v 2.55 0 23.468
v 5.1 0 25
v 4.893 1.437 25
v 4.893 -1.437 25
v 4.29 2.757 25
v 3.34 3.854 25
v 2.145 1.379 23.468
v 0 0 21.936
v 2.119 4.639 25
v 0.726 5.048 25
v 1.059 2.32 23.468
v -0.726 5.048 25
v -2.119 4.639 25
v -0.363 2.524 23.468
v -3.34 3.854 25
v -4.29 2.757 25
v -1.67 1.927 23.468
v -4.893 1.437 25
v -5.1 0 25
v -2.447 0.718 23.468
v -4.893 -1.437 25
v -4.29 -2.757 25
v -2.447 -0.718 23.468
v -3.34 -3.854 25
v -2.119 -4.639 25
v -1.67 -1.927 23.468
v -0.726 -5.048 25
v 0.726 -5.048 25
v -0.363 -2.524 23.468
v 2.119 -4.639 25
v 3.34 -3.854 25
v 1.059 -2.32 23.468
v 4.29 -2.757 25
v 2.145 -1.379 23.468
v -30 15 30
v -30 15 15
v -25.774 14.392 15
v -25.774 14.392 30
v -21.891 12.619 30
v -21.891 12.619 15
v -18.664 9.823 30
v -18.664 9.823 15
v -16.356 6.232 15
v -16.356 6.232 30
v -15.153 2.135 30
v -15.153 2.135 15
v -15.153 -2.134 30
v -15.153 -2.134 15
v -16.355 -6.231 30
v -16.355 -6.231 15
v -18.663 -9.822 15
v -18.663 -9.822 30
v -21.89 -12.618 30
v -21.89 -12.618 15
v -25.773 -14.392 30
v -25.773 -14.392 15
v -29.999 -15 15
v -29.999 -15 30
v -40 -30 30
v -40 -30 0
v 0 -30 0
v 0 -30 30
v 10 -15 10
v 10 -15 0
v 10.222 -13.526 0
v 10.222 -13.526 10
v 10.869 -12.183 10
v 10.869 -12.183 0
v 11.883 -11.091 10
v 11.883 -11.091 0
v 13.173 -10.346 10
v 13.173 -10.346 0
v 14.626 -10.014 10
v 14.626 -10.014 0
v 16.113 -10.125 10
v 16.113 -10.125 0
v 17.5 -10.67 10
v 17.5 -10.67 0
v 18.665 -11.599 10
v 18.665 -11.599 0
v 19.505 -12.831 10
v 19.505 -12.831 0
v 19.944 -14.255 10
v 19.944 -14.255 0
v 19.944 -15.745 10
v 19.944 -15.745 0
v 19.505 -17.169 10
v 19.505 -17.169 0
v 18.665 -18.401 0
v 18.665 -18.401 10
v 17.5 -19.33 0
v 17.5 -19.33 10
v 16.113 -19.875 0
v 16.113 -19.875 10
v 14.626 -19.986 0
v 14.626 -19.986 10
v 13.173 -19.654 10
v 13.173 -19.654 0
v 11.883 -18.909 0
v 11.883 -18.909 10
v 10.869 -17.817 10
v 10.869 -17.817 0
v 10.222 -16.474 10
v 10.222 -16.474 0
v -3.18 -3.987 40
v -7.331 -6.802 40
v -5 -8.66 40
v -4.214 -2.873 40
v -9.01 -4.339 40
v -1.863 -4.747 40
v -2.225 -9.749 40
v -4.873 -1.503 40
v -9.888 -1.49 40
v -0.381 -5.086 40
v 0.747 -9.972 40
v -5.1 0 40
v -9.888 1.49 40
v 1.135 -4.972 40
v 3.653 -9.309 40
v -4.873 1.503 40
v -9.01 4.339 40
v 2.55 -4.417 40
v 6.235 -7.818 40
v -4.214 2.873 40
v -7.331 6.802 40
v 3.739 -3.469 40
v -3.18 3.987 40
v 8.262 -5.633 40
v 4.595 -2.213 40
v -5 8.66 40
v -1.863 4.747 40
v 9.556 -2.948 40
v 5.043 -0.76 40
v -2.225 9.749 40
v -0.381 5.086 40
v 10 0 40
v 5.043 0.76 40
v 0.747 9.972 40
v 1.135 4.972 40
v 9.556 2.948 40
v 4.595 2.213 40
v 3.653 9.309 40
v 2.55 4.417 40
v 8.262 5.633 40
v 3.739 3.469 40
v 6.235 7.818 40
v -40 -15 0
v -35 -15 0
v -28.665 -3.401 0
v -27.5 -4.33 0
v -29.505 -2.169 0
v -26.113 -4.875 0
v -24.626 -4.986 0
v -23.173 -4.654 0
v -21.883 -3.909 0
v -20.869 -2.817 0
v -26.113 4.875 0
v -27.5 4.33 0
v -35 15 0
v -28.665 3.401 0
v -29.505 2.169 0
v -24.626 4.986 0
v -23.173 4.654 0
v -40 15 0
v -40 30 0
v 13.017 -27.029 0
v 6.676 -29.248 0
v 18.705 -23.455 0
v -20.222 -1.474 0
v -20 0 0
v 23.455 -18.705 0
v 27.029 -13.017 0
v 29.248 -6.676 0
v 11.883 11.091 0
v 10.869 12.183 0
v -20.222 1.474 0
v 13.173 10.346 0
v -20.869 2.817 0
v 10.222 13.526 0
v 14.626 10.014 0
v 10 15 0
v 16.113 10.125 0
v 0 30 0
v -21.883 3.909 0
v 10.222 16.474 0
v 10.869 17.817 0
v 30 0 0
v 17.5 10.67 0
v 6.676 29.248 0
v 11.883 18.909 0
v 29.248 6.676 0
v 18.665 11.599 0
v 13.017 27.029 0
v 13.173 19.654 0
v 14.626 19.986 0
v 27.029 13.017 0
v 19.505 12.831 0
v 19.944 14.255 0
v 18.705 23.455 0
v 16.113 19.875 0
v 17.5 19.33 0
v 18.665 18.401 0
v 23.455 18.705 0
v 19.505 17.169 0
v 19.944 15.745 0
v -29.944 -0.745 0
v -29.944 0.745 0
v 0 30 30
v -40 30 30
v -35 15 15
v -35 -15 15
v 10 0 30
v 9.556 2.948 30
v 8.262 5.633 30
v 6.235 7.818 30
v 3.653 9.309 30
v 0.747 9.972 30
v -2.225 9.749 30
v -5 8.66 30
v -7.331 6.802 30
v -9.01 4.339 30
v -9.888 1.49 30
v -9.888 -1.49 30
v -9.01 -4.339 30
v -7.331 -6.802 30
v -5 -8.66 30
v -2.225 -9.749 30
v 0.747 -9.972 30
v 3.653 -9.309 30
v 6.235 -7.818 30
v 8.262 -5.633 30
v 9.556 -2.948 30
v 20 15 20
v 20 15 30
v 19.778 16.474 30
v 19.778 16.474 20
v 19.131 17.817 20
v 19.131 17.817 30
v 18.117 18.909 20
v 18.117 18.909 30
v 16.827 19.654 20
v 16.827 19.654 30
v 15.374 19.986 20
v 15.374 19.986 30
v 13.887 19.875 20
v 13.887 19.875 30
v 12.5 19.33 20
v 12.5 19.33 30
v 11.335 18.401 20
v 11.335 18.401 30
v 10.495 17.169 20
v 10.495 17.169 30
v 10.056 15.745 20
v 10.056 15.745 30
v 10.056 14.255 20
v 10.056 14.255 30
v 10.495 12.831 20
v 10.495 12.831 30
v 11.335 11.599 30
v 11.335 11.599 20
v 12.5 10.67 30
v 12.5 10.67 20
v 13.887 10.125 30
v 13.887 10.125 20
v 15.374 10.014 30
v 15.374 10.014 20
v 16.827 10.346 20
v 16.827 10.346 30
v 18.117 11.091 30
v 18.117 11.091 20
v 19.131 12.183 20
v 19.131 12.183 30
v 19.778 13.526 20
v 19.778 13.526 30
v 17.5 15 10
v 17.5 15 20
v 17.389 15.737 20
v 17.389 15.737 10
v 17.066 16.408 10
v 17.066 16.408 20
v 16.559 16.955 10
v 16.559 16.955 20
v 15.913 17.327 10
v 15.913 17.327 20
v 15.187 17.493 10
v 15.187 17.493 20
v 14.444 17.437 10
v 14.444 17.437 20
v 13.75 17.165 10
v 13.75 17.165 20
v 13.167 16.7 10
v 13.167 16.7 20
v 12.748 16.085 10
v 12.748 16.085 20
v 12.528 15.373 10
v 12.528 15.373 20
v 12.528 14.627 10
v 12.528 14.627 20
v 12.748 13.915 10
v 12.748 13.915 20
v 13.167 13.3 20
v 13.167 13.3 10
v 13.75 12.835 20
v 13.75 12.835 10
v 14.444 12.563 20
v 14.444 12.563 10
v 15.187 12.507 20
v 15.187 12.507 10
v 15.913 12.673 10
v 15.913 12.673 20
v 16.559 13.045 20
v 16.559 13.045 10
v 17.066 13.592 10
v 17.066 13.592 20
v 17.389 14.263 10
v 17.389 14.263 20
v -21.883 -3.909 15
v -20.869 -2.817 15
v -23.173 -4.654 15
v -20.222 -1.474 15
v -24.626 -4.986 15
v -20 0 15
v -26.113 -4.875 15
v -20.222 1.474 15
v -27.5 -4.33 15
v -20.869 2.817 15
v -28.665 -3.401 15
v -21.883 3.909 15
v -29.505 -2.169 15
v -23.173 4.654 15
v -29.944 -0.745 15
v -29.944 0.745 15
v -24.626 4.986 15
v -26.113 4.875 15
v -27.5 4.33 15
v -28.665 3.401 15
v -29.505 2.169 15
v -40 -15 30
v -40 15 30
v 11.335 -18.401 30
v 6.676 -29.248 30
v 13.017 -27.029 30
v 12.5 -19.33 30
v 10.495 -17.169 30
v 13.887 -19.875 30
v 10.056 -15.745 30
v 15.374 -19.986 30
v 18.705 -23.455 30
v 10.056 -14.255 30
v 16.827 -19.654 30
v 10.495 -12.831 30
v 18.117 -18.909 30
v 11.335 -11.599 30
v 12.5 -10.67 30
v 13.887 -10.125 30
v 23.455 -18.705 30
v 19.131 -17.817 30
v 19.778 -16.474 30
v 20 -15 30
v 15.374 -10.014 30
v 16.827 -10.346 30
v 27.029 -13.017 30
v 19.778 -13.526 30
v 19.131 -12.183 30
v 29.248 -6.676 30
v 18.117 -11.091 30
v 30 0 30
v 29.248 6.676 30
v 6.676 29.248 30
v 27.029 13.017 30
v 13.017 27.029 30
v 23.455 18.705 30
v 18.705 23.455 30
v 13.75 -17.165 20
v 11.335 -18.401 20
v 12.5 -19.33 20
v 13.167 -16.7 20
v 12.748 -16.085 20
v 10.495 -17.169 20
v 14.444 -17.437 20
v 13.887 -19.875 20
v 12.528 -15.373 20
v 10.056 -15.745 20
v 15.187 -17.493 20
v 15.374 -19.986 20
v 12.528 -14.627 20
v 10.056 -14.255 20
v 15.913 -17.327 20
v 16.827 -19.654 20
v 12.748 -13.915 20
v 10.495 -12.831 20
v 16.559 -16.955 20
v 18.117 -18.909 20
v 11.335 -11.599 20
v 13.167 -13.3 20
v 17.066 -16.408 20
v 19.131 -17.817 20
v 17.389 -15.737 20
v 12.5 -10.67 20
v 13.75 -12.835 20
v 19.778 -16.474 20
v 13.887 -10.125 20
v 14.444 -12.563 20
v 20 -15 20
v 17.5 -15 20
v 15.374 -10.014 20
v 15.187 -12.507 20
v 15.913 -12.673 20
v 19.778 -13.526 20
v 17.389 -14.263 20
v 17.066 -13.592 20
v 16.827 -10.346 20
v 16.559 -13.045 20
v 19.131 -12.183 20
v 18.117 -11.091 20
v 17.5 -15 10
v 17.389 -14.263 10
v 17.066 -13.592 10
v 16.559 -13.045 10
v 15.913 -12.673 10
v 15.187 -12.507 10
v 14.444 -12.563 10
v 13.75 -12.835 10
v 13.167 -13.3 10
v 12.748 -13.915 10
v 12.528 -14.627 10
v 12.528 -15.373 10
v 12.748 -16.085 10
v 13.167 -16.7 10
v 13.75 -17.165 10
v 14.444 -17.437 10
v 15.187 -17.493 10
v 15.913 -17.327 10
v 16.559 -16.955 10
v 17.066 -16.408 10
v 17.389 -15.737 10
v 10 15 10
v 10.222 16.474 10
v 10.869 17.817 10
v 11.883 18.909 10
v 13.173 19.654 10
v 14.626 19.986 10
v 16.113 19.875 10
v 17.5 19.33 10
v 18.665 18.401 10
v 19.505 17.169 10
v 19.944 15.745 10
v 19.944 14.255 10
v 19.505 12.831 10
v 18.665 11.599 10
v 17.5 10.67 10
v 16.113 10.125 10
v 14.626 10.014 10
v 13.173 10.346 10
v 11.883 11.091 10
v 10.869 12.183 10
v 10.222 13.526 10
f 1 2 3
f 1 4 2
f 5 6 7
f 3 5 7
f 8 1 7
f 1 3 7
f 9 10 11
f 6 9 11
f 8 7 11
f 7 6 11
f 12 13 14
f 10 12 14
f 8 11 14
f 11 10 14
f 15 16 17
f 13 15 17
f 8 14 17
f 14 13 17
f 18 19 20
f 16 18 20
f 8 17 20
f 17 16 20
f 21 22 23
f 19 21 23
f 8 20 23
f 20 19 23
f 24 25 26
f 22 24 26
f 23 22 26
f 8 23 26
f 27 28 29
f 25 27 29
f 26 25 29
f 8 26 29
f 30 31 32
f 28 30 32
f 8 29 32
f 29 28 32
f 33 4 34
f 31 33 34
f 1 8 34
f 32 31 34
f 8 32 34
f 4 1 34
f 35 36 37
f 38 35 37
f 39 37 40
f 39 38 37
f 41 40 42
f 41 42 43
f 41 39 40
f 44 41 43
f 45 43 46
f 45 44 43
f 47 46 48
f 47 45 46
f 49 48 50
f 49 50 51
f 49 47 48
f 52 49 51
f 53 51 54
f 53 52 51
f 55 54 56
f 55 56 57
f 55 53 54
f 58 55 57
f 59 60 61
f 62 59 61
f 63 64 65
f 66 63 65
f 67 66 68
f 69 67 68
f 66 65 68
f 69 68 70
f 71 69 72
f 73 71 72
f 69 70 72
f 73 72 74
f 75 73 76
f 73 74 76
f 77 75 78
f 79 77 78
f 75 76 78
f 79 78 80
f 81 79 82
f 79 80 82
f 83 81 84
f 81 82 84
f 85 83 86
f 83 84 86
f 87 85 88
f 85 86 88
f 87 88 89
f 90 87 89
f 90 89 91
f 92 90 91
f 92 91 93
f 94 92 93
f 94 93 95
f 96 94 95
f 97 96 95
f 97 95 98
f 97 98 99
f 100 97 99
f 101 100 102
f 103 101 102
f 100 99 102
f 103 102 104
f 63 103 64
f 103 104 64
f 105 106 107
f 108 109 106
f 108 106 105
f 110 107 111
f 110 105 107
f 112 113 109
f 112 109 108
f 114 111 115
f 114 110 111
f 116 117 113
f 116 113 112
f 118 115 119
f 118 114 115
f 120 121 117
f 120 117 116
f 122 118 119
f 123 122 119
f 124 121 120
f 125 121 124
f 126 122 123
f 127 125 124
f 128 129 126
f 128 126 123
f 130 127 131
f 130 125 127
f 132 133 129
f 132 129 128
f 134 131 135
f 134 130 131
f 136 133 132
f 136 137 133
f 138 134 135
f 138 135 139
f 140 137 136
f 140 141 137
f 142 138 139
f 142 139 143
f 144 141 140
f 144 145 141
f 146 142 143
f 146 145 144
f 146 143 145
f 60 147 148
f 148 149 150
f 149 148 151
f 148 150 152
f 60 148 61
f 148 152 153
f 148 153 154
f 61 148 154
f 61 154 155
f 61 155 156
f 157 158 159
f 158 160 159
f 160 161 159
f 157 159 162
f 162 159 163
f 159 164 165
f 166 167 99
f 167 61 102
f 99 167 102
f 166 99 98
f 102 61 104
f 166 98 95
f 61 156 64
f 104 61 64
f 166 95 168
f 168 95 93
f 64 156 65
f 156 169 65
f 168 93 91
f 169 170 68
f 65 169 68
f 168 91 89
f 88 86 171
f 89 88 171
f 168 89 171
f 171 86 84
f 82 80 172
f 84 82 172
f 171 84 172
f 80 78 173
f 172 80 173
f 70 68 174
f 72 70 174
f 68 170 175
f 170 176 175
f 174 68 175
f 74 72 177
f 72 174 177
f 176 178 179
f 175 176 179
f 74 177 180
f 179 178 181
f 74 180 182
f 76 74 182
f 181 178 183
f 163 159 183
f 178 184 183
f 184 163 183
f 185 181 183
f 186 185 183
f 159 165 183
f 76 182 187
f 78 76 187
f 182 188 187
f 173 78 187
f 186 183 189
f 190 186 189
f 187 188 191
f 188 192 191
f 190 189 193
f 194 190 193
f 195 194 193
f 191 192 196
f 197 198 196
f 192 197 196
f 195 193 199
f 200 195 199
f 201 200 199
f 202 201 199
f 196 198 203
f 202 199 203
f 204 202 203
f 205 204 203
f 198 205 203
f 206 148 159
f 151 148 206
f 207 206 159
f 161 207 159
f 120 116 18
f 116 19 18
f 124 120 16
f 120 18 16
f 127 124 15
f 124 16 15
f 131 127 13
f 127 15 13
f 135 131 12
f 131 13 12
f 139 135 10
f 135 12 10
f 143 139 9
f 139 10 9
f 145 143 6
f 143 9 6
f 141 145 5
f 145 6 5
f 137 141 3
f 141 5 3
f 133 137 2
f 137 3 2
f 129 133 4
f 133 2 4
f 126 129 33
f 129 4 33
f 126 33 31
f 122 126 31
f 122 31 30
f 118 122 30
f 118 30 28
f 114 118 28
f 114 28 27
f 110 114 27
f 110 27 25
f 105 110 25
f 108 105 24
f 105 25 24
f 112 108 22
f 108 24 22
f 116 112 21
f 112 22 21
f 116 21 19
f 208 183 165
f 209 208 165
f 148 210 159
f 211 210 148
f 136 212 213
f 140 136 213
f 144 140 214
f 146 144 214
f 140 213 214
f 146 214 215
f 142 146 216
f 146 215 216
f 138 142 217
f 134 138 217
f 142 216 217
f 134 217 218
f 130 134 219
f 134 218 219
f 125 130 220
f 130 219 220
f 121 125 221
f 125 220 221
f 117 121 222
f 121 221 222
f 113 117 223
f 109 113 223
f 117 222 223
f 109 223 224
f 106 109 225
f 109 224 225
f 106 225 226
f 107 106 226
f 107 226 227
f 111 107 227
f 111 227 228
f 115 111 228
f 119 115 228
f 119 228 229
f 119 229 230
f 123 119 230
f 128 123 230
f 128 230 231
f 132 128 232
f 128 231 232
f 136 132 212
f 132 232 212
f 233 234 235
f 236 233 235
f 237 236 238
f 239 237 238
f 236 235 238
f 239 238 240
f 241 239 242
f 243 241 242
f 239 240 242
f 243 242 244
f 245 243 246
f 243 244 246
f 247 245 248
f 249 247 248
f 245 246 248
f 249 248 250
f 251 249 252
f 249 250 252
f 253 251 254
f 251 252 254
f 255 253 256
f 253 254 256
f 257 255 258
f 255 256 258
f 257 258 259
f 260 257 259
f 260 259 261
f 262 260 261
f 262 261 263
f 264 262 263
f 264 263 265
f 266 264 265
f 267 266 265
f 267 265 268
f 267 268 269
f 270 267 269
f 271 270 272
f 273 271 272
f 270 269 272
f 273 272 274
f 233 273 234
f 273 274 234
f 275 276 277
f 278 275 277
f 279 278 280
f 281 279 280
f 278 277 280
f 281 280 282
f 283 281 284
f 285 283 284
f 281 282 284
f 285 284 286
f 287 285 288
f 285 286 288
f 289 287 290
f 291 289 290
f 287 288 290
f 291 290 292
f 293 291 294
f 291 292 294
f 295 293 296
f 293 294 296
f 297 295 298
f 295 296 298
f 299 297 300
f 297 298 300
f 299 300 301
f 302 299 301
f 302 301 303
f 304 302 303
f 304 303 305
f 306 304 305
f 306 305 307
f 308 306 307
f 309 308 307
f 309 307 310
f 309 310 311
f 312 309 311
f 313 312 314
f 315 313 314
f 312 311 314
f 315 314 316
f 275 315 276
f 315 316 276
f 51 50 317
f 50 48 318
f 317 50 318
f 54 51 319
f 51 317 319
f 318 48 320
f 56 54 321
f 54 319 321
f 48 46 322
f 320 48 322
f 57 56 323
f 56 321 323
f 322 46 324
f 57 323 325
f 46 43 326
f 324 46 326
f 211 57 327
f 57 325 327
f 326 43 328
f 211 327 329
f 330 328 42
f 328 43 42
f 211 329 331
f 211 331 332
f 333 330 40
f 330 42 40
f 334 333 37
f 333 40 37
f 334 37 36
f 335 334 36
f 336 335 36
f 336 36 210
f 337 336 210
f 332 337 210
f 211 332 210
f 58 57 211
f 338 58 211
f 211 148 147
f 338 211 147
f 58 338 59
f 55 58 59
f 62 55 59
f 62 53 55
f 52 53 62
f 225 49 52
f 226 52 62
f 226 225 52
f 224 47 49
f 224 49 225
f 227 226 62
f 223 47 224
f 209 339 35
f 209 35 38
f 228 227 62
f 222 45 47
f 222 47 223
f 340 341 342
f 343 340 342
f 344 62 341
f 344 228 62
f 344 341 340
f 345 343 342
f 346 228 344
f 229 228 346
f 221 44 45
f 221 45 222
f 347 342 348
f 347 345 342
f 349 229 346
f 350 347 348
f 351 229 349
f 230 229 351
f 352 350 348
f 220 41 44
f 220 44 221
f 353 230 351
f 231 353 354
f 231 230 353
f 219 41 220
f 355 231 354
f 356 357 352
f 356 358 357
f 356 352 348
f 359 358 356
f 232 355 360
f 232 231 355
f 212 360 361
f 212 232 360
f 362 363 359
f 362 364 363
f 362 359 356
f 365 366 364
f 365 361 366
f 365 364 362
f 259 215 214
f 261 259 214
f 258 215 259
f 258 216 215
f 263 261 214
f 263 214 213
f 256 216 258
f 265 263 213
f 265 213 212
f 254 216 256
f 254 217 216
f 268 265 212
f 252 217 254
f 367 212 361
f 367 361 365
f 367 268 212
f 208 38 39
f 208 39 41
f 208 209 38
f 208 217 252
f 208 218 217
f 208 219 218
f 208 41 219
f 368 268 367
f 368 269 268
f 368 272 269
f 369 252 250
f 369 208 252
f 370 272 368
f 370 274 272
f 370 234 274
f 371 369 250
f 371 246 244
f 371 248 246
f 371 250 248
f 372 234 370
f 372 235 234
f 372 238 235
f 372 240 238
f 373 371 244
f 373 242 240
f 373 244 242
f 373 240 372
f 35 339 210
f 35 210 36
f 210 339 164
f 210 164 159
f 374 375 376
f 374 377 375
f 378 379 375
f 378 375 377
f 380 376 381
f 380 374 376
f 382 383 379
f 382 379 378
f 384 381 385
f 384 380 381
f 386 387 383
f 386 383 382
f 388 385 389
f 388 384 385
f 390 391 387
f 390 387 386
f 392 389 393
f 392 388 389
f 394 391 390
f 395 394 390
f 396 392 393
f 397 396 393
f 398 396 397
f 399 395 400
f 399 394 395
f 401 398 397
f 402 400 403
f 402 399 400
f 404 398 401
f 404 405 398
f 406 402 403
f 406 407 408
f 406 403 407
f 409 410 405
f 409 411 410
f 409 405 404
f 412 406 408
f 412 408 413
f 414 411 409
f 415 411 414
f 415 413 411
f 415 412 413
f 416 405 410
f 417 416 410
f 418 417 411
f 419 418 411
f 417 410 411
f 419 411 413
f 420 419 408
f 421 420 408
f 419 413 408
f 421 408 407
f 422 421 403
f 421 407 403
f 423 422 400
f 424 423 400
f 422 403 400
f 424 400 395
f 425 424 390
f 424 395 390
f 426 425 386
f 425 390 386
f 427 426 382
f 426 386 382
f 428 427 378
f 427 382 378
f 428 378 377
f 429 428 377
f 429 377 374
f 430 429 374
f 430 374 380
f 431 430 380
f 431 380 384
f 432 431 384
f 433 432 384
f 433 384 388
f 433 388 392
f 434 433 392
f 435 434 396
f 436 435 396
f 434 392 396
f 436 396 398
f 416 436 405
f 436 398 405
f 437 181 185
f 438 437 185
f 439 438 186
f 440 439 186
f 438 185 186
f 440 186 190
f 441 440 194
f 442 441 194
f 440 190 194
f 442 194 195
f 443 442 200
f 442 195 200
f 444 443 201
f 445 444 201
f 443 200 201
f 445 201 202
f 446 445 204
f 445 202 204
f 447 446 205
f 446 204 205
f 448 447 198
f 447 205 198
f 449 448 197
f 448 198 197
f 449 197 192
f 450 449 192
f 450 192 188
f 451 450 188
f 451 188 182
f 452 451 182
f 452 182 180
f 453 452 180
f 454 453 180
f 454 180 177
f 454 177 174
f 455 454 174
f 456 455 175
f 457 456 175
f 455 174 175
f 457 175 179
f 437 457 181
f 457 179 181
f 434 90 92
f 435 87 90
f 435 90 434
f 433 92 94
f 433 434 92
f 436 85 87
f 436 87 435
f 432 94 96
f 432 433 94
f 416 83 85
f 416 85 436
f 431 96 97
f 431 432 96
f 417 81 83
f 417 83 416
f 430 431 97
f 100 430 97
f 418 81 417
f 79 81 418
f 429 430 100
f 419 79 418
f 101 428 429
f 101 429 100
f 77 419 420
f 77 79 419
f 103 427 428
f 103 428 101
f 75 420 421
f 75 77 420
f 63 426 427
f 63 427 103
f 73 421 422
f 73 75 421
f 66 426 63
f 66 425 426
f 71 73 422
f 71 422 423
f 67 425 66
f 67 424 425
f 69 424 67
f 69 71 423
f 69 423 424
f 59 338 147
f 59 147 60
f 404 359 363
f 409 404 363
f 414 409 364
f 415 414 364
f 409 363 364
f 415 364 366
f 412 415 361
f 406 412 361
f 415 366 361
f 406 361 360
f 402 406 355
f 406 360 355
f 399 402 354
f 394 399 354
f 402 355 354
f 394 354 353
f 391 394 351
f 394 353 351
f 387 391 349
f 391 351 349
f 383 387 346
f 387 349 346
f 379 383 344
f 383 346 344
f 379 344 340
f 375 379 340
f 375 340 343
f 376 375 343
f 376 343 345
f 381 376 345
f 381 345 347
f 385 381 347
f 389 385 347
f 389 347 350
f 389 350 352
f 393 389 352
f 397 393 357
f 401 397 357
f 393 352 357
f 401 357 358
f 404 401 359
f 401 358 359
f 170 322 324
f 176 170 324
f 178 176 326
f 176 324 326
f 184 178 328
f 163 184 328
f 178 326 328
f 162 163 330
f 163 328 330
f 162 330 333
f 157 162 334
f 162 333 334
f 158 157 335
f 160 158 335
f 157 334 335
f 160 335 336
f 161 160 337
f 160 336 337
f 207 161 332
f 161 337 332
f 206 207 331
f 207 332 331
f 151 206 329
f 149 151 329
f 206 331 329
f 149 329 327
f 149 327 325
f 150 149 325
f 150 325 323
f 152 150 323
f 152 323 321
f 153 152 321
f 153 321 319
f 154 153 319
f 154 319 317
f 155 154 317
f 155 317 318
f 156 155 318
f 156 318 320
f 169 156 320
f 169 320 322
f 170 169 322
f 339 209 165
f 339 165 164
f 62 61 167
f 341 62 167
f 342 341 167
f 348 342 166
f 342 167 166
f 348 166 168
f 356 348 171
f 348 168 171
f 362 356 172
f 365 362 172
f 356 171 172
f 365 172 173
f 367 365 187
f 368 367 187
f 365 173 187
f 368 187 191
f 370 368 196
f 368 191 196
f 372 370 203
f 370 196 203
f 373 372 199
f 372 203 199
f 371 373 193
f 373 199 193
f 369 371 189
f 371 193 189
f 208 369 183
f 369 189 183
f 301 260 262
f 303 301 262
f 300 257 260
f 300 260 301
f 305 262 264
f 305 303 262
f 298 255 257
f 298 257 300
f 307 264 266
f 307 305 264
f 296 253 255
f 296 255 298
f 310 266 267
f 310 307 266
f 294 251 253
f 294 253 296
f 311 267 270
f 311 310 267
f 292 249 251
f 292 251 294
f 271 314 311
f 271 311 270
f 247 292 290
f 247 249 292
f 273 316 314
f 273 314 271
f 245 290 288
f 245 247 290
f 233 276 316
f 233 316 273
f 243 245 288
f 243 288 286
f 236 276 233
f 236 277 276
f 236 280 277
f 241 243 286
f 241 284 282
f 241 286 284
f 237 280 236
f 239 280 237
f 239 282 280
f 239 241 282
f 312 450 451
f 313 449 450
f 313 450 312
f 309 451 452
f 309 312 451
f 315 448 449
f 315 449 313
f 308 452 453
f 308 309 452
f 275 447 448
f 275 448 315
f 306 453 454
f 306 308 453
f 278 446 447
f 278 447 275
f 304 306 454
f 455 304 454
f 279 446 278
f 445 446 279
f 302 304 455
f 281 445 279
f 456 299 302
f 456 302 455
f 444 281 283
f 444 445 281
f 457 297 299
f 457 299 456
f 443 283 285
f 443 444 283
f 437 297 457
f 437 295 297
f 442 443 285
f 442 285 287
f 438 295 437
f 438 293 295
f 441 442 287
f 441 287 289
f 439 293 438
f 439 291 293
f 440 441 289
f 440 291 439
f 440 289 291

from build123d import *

# Parameters (mm, degrees)
BOSS_EXTRUDE1_DEPTH    = 30
BOSS_EXTRUDE3_DEPTH    = 30
CUT_EXTRUDE1_DEPTH     = 15
SKETCH7_R              = 5
CUT_EXTRUDE2_DEPTH     = 35
SKETCH8_R              = 10
BOSS_EXTRUDE4_DEPTH    = 10
SKETCH10_R             = 5
CUT_EXTRUDE6_DEPTH     = 10
SKETCH12_R             = 2.5
CUT_EXTRUDE7_DEPTH     = 10
SKETCH13_R             = 5
CUT_EXTRUDE8_DEPTH     = 10
M12_TAPPED_HOLE1_D     = 10.2
M12_TAPPED_HOLE1_DEPTH = 15
M12_TAPPED_HOLE1_TIP   = 3.064389157


with BuildPart() as part:
    # Sketch1 → Boss-Extrude1 (new body)
    with BuildSketch(Plane.XY):
        with BuildLine():
            Line((-40, 30), (-40, 15))
            Line((-40, 15), (-30, 15))
            ThreePointArc((-30, 15), (-15, 0), (-30, -15))
            Line((-30, -15), (-40, -15))
            Line((-40, -15), (-40, -30))
            Line((-40, -30), (0, -30))
            ThreePointArc((0, -30), (30, 0), (0, 30))
            Line((0, 30), (-40, 30))
        make_face()
    extrude(amount=BOSS_EXTRUDE1_DEPTH)

    # Sketch5 → Boss-Extrude3 (add)
    with BuildSketch(Plane.XY.offset(30)):
        with BuildLine():
            Line((-30, 15), (-35, 15))
            Line((-35, 15), (-35, -15))
            Line((-35, -15), (-30, -15))
            ThreePointArc((-30, -15), (-15, 0), (-30, 15))
        make_face()
    extrude(amount=-BOSS_EXTRUDE3_DEPTH)

    # Sketch6 → Cut-Extrude1 (cut)
    with BuildSketch(Plane.XY.offset(30)):
        with BuildLine():
            Line((-35, 15), (-30, 15))
            ThreePointArc((-30, 15), (-14.999999991, 0.000506597), (-29.998986771, -15))
            Line((-29.998986771, -15), (-35, -15))
            Line((-35, -15), (-35, 15))
        make_face()
    extrude(amount=-CUT_EXTRUDE1_DEPTH, mode=Mode.SUBTRACT)

    # Sketch7 → Cut-Extrude2 (cut)
    with BuildSketch(Plane.XY.offset(15)):
        with Locations((-25, 0)):
            Circle(SKETCH7_R)
    extrude(amount=-CUT_EXTRUDE2_DEPTH, mode=Mode.SUBTRACT)

    # Sketch8 → Boss-Extrude4 (add)
    with BuildSketch(Plane.XY.offset(30)):
        Circle(SKETCH8_R)
    extrude(amount=BOSS_EXTRUDE4_DEPTH)

    # Sketch10 → Cut-Extrude6 (cut)
    with BuildSketch(Plane.XY.offset(30)):
        with Locations((15, 15)):
            Circle(SKETCH10_R)
        with Locations((15, -15)):
            Circle(SKETCH10_R)
    extrude(amount=-CUT_EXTRUDE6_DEPTH, mode=Mode.SUBTRACT)

    # Sketch12 → Cut-Extrude7 (cut)
    with BuildSketch(Plane.XY.offset(20)):
        with Locations((15, 15)):
            Circle(SKETCH12_R)
        with Locations((15, -15)):
            Circle(SKETCH12_R)
    extrude(amount=-CUT_EXTRUDE7_DEPTH, mode=Mode.SUBTRACT)

    # Sketch13 → Cut-Extrude8 (cut)
    with BuildSketch(Plane(origin=(0, 0, 0), x_dir=(-1, 0, 0), z_dir=(0, 0, -1))):
        with Locations((-15, 15)):
            Circle(SKETCH13_R)
        with Locations((-15, -15)):
            Circle(SKETCH13_R)
    extrude(amount=-CUT_EXTRUDE8_DEPTH, mode=Mode.SUBTRACT)

    # M12 Tapped Hole1
    with Locations(Plane.XY.offset(40)):
        with Locations((0, 0)):
            Hole(M12_TAPPED_HOLE1_D / 2, depth=M12_TAPPED_HOLE1_DEPTH)
            with Locations((0, 0, -(M12_TAPPED_HOLE1_DEPTH + M12_TAPPED_HOLE1_TIP / 2))):  # 118° drill point
                Cone(0, M12_TAPPED_HOLE1_D / 2, M12_TAPPED_HOLE1_TIP, mode=Mode.SUBTRACT)


solid = part.part
